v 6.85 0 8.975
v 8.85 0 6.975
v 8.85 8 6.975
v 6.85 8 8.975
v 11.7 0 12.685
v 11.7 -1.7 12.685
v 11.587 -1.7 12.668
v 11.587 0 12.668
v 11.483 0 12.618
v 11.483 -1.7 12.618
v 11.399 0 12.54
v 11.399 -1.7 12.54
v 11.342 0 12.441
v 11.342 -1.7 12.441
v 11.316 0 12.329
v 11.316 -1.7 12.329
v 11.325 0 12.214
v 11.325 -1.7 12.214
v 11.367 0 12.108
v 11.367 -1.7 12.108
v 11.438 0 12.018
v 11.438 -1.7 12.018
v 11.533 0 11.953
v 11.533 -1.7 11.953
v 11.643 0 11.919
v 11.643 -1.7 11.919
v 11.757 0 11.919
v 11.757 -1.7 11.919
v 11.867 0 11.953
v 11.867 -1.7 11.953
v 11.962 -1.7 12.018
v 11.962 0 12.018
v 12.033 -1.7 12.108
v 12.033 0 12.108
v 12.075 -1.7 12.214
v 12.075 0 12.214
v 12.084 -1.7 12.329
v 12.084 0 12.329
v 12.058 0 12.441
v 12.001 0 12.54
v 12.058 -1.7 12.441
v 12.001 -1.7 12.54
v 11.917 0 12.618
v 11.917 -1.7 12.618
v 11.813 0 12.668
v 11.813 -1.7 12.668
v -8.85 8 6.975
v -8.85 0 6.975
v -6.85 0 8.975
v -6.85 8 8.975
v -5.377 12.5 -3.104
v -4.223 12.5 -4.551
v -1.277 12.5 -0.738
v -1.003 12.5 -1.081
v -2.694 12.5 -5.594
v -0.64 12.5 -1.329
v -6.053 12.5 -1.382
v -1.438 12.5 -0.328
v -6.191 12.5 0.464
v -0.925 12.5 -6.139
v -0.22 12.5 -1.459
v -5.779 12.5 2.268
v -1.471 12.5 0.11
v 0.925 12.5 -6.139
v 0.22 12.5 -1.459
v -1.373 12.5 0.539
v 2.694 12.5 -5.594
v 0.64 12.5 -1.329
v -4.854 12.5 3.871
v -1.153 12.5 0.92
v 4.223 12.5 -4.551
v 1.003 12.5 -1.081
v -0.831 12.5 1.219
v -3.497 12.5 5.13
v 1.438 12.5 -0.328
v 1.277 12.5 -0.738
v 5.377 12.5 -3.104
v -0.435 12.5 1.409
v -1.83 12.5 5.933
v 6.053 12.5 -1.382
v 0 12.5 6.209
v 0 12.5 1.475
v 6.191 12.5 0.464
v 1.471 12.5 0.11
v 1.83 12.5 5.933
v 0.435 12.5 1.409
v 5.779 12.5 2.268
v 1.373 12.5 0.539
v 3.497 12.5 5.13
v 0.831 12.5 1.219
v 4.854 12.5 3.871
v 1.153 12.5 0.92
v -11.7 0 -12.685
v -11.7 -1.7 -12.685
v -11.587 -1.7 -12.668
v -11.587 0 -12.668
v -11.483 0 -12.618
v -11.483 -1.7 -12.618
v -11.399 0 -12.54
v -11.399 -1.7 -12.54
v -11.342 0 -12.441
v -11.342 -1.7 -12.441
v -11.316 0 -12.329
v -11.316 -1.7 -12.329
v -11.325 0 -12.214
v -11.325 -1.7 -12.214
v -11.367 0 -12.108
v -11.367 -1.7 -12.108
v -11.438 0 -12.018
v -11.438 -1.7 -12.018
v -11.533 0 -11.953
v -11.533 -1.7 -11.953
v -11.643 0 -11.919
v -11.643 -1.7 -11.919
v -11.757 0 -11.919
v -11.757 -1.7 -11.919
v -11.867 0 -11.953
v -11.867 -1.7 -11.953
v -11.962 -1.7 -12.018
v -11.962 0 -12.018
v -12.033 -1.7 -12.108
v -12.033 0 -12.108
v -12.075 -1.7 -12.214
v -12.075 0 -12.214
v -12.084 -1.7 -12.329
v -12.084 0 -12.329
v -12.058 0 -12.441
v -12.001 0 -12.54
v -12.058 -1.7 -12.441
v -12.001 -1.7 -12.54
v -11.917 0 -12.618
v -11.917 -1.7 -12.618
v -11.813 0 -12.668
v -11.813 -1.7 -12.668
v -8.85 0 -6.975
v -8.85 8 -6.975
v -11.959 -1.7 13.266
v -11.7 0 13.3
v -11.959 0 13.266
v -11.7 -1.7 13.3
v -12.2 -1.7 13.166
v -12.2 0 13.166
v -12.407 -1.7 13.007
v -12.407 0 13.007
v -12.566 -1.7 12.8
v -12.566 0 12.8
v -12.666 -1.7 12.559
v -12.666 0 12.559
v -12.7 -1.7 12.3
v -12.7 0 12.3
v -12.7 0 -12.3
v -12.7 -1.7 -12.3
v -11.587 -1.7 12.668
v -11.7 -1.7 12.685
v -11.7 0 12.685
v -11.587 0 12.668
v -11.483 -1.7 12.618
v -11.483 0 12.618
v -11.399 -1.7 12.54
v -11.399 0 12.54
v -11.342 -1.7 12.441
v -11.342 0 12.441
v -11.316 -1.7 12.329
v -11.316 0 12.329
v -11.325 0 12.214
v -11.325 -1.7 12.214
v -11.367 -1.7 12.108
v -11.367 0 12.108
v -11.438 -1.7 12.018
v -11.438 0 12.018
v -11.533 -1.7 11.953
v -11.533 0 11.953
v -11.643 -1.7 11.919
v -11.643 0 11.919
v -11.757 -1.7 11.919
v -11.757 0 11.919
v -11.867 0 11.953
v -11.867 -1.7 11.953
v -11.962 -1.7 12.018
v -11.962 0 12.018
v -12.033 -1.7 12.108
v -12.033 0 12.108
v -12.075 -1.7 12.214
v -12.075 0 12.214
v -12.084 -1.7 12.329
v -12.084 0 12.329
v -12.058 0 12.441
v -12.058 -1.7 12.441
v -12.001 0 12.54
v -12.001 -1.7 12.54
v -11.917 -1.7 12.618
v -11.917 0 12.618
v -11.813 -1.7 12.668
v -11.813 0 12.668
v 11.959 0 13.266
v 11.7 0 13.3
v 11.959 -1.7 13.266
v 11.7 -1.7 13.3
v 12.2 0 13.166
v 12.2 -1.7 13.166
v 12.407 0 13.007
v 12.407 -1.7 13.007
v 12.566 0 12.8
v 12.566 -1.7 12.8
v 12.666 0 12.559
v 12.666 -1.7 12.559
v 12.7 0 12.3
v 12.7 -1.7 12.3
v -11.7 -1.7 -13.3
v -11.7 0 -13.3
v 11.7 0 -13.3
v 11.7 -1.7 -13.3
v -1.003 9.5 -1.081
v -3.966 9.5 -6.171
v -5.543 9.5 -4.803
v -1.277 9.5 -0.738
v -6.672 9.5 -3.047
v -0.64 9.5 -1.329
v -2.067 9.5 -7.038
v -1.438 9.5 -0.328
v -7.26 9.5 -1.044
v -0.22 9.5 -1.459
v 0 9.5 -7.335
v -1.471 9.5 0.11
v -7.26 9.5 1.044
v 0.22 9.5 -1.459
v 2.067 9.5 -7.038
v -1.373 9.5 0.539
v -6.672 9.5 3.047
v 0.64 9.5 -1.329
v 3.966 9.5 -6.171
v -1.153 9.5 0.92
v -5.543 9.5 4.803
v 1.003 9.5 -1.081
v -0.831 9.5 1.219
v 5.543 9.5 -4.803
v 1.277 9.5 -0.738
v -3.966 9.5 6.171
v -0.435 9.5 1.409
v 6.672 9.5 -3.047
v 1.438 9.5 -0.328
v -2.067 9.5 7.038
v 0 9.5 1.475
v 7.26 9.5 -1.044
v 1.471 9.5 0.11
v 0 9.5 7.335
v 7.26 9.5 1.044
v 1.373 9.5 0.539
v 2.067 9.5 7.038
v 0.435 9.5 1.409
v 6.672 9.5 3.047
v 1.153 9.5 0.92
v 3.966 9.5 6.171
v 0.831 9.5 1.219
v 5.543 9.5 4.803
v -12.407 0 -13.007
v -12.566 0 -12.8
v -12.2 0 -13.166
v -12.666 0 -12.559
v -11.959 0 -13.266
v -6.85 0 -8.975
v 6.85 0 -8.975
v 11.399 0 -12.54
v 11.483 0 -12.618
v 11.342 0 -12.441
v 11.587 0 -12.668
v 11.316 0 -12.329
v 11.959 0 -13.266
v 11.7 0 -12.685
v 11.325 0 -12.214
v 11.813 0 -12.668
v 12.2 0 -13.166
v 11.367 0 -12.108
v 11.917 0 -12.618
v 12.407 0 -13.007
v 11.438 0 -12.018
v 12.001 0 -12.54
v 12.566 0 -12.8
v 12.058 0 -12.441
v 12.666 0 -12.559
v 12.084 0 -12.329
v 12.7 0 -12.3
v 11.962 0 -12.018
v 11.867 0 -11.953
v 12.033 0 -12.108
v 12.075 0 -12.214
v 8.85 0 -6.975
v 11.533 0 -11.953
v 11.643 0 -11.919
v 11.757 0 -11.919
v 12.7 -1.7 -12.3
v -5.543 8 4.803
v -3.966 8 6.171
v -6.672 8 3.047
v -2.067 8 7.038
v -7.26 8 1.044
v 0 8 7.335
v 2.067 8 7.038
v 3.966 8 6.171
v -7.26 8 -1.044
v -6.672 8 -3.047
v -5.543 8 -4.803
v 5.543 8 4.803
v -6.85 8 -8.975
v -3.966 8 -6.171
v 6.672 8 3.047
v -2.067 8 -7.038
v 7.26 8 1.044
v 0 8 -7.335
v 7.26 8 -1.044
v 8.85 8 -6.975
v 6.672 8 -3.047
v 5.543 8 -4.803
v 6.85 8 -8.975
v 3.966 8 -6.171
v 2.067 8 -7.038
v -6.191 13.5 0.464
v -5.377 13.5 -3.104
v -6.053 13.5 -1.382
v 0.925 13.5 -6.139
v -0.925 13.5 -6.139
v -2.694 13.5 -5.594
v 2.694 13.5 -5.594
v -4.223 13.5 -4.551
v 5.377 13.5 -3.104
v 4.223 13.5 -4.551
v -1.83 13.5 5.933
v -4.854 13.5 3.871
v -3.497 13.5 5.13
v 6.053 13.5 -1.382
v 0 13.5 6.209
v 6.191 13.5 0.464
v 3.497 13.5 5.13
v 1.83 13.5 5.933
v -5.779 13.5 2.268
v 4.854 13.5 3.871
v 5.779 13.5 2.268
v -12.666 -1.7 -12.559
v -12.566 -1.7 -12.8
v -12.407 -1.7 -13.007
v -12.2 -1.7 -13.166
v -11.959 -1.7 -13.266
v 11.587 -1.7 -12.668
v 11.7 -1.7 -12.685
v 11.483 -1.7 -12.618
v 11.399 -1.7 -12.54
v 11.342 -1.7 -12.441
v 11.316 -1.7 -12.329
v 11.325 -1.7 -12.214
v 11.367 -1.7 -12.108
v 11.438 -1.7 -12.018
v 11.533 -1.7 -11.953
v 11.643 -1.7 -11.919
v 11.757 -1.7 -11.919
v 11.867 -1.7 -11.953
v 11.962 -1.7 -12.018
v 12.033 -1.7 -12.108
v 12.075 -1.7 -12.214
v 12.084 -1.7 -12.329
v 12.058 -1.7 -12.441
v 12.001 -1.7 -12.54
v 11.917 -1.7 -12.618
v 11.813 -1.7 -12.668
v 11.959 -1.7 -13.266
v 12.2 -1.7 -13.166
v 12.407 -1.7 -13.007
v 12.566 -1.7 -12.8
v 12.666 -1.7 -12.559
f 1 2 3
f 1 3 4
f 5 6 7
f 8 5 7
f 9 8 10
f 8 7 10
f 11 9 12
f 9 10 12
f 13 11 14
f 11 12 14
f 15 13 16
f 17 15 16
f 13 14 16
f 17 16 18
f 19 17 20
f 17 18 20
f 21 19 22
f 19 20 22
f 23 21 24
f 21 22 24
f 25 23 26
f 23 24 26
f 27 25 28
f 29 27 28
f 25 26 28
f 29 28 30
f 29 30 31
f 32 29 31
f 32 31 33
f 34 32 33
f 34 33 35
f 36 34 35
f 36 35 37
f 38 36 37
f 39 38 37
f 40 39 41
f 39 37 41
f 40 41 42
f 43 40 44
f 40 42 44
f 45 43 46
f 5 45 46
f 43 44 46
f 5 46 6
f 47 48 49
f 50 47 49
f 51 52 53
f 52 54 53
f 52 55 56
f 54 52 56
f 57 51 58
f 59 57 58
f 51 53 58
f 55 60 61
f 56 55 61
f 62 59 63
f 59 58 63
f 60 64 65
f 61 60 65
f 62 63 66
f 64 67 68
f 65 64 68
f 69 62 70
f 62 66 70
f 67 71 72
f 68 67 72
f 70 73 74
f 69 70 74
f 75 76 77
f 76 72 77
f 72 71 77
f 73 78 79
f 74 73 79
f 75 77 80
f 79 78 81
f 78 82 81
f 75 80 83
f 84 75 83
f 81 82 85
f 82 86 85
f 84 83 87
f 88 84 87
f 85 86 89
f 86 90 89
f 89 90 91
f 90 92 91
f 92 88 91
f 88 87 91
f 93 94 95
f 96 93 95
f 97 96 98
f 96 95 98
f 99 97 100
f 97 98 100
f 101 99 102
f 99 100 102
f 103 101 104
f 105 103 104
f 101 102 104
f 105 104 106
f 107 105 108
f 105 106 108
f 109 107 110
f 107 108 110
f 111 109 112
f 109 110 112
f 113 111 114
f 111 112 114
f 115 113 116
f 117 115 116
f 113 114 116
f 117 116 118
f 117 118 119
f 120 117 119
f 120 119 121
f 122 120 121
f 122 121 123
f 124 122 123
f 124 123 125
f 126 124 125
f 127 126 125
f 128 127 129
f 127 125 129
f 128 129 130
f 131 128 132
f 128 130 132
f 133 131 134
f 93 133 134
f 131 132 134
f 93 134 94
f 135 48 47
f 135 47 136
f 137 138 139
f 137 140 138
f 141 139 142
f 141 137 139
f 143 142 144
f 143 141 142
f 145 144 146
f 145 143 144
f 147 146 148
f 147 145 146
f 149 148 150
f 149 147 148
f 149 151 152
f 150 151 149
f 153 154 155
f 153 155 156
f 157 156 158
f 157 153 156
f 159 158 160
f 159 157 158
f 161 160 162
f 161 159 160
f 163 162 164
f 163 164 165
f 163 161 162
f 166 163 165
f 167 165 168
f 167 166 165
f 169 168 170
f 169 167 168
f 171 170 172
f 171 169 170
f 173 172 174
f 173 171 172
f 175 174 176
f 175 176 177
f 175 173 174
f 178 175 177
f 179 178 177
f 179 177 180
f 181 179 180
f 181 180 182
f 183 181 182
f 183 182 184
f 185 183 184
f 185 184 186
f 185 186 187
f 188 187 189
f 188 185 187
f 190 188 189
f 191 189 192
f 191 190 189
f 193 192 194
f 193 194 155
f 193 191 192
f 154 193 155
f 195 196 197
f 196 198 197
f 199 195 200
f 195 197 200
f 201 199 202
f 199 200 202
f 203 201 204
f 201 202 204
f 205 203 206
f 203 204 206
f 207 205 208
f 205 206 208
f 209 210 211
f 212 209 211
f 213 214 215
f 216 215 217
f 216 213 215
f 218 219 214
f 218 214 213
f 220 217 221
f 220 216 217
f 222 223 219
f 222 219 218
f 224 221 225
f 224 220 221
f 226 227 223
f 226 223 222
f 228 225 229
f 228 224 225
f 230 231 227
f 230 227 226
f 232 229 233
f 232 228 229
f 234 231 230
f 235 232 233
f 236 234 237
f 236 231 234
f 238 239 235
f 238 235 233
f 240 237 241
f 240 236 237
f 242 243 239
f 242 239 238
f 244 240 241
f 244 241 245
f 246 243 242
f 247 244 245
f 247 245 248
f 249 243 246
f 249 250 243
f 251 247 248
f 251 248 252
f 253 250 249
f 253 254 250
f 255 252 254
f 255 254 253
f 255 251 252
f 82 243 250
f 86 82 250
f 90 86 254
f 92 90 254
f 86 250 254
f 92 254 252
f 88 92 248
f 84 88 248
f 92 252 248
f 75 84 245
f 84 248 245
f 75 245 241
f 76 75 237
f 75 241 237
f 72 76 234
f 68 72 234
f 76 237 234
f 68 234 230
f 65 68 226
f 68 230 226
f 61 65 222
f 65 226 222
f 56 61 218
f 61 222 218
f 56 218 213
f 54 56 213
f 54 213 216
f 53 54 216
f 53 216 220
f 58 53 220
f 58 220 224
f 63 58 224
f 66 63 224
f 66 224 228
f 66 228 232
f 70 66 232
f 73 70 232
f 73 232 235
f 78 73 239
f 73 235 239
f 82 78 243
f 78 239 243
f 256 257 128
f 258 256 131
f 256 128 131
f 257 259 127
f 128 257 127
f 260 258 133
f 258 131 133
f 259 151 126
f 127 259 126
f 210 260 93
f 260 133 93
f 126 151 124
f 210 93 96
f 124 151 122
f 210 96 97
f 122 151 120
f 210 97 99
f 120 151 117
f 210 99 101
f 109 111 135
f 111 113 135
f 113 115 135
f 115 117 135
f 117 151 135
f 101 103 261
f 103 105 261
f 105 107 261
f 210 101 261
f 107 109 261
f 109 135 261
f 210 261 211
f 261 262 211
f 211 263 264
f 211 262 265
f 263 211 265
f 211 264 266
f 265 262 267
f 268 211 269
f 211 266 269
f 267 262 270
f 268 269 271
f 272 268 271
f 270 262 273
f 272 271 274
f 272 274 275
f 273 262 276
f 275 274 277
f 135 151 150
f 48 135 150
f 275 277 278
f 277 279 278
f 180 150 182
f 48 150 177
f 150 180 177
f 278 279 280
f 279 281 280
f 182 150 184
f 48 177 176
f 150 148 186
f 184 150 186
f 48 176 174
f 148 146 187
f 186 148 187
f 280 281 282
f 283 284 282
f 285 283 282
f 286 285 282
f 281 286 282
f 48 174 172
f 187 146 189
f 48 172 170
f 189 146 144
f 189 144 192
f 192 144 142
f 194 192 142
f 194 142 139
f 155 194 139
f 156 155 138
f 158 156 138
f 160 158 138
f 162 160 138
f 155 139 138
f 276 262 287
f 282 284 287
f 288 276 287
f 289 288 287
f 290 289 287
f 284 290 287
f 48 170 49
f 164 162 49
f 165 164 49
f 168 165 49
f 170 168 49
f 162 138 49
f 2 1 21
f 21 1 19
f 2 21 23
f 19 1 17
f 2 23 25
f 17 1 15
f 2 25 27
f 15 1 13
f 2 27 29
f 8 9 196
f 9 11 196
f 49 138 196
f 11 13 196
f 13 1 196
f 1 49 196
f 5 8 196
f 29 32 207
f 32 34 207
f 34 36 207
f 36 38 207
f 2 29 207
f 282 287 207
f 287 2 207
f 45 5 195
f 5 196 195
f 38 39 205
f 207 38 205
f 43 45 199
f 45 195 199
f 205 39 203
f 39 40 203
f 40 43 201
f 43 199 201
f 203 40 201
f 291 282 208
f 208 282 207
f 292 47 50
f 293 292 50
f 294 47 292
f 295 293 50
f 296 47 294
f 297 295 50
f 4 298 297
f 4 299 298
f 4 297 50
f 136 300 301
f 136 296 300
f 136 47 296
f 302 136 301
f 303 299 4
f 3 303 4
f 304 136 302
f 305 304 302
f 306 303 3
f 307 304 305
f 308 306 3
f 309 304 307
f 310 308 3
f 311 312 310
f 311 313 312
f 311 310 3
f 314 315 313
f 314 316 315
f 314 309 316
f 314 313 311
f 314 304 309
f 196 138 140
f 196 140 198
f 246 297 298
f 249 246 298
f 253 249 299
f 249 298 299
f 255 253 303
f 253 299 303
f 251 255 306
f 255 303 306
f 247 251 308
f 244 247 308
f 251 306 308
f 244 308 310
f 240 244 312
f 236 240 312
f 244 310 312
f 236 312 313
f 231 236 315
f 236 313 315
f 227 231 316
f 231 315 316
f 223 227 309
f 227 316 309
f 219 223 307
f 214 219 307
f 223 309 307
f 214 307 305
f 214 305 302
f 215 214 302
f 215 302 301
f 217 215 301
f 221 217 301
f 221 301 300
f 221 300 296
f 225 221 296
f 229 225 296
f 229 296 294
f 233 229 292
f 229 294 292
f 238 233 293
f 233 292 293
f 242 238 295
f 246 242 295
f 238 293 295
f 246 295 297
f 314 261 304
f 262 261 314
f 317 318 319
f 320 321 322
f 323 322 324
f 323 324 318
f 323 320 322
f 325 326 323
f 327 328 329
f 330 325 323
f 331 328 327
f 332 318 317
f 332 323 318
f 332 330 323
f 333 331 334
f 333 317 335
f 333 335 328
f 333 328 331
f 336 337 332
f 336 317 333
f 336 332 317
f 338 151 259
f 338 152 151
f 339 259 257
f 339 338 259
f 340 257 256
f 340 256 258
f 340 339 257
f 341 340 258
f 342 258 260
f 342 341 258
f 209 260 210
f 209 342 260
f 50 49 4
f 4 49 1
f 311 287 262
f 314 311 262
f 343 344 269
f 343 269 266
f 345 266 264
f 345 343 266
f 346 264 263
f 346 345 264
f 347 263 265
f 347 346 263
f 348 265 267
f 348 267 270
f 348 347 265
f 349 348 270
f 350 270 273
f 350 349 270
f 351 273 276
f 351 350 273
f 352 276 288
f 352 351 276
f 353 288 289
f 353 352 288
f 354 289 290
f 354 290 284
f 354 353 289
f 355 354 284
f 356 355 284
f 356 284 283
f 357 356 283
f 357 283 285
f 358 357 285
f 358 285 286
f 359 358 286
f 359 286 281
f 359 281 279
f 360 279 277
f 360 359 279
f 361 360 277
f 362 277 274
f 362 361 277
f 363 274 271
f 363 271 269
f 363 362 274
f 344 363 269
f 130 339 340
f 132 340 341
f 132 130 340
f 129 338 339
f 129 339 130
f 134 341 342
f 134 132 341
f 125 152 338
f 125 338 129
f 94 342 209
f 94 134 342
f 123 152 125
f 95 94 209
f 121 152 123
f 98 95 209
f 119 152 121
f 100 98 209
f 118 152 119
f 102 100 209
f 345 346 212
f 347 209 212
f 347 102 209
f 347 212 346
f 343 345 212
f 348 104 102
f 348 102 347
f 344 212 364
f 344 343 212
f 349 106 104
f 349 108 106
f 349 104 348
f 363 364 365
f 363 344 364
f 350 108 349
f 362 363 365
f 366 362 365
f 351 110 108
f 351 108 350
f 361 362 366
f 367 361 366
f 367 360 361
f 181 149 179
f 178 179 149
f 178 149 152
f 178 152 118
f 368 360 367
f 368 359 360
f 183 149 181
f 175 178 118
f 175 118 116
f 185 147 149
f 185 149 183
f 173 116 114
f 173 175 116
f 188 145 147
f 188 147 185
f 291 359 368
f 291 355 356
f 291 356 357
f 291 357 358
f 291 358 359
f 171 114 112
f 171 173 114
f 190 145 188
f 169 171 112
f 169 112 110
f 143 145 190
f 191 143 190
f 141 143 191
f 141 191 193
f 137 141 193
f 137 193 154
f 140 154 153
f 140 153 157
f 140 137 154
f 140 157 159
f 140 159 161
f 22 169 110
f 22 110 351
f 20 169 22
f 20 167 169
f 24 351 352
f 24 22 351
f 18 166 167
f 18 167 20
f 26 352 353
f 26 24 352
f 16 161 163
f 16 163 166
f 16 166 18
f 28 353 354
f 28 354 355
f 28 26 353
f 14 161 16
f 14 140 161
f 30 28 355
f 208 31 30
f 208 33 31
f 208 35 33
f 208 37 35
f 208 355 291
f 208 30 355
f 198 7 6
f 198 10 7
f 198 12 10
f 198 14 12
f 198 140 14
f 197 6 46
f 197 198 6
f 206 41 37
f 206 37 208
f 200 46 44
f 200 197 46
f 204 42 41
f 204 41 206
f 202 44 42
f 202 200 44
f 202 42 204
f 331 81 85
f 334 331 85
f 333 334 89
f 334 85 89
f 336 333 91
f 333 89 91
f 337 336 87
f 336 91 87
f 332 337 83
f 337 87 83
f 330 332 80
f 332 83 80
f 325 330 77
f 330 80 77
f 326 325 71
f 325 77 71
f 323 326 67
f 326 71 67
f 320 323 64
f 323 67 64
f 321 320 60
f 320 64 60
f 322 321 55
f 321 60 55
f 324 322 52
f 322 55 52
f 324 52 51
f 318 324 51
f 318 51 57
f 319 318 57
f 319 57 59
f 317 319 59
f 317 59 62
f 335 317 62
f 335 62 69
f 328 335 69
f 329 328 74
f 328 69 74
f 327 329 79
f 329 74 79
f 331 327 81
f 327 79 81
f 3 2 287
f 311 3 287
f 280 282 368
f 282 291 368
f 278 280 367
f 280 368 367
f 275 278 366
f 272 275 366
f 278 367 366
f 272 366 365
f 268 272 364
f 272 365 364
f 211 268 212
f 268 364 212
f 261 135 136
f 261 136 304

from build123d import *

# Parameters (mm, degrees)
ESQUISSE1_W                                = 17.7
ESQUISSE1_H                                = 17.95
BOSS_EXTRU_1_DEPTH                         = 8
ENL_V_MAT_EXTRU_1_DEPTH                    = 8
SYM_TRIE1_AT_THE_SECOND_PLANE_COPY_1_DEPTH = 8
ESQUISSE4_R                                = 7.334991569
BOSS_EXTRU_2_DEPTH                         = 1.5
ESQUISSE5_R                                = 1.475
BOSS_EXTRU_3_DEPTH                         = 3
ESQUISSE6_R                                = 6.208536563
BOSS_EXTRU_4_DEPTH                         = 1
ESQUISSE7_W                                = 25.4
ESQUISSE7_H                                = 26.6
BOSS_EXTRU_5_DEPTH                         = 1.7
CONG_1_R                                   = 1
CONG_2_R                                   = 1
ESQUISSE8_R                                = 0.384895333
ENL_V_MAT_EXTRU_2_DEPTH                    = 1.7
SYM_TRIE5_AT_THE_SECOND_PLANE_COPY_1_SKE_R = 0.384895333
SYM_TRIE5_AT_THE_SECOND_PLANE_COPY_1_DEPTH = 1.7


with BuildPart() as part:
    # Esquisse1 → Boss.-Extru.1 (new body)
    with BuildSketch(Plane(origin=(0, 0, 0), x_dir=(1, 0, 0), z_dir=(0, 1, 0))):
        Rectangle(ESQUISSE1_W, ESQUISSE1_H)
    extrude(amount=BOSS_EXTRU_1_DEPTH)

    # Esquisse2 → Enlèv. mat.-Extru.1 (cut)
    with BuildSketch(Plane(origin=(0, 8, 0), x_dir=(1, 0, 0), z_dir=(0, 1, 0))):
        Polygon((-8.85, -6.975), (-6.85, -8.975), (-8.85, -8.975), align=None)
    enl_v_mat_extru_1 = extrude(amount=-ENL_V_MAT_EXTRU_1_DEPTH, mode=Mode.SUBTRACT)

    # Symétrie1: Enlèv. mat.-Extru.1 across plane
    add(enl_v_mat_extru_1.mirror(Plane.XY), mode=Mode.SUBTRACT)

    # Symétrie1 at the second plane: Enlèv. mat.-Extru.1 across plane
    add(enl_v_mat_extru_1.mirror(Plane(origin=(0, 0, 0), x_dir=(0, 0, 1), z_dir=(1, 0, 0))), mode=Mode.SUBTRACT)

    # Symétrie1 at the second plane copy 1 ske → Symétrie1 at the second plane copy 1 (cut)
    with BuildSketch(Plane(origin=(0, 8, 0), x_dir=(-1, 0, 0), z_dir=(0, 1, 0))):
        Polygon((-8.85, -6.975), (-6.85, -8.975), (-8.85, -8.975), align=None)
    extrude(amount=-SYM_TRIE1_AT_THE_SECOND_PLANE_COPY_1_DEPTH, mode=Mode.SUBTRACT)

    # Esquisse4 → Boss.-Extru.2 (add)
    with BuildSketch(Plane(origin=(0, 8, 0), x_dir=(1, 0, 0), z_dir=(0, 1, 0))):
        with Locations(Location((0, 0, 0), (0, 0, 270))):
            Circle(ESQUISSE4_R)
    extrude(amount=BOSS_EXTRU_2_DEPTH)

    # Esquisse5 → Boss.-Extru.3 (add)
    with BuildSketch(Plane(origin=(0, 9.5, 0), x_dir=(1, 0, 0), z_dir=(0, 1, 0))):
        with Locations(Location((0, 0, 0), (0, 0, 270))):
            Circle(ESQUISSE5_R)
    extrude(amount=BOSS_EXTRU_3_DEPTH)

    # Esquisse6 → Boss.-Extru.4 (add)
    with BuildSketch(Plane(origin=(0, 12.5, 0), x_dir=(1, 0, 0), z_dir=(0, 1, 0))):
        with Locations(Location((0, 0, 0), (0, 0, 270))):
            Circle(ESQUISSE6_R)
    extrude(amount=BOSS_EXTRU_4_DEPTH)

    # Esquisse7 → Boss.-Extru.5 (add)
    with BuildSketch(Plane.XZ):
        Rectangle(ESQUISSE7_W, ESQUISSE7_H)
    extrude(amount=BOSS_EXTRU_5_DEPTH)

    # Congé1
    cong_1_edges = [part.edges().sort_by_distance(p)[0] for p in [
        (12.7, -0.85, 13.3),
    ]]
    fillet(cong_1_edges, radius=CONG_1_R)

    # Congé2
    cong_2_edges = [part.edges().sort_by_distance(p)[0] for p in [
        (12.7, -0.85, -13.3),
        (-12.7, -0.85, 13.3),
        (-12.7, -0.85, -13.3),
    ]]
    fillet(cong_2_edges, radius=CONG_2_R)

    # Esquisse8 → Enlèv. mat.-Extru.2 (cut)
    with BuildSketch(Plane.XZ.offset(1.7)):
        with Locations(Location((-11.7, -12.3, 0), (0, 0, 270))):
            Circle(ESQUISSE8_R)
    enl_v_mat_extru_2 = extrude(amount=-ENL_V_MAT_EXTRU_2_DEPTH, mode=Mode.SUBTRACT)

    # Symétrie5: Enlèv. mat.-Extru.2 across plane
    add(enl_v_mat_extru_2.mirror(Plane.XY), mode=Mode.SUBTRACT)

    # Symétrie5 at the second plane: Enlèv. mat.-Extru.2 across plane
    add(enl_v_mat_extru_2.mirror(Plane(origin=(0, 0, 0), x_dir=(0, 0, 1), z_dir=(1, 0, 0))), mode=Mode.SUBTRACT)

    # Symétrie5 at the second plane copy 1 ske → Symétrie5 at the second plane copy 1 (cut)
    with BuildSketch(Plane(origin=(0, -1.7, 0), x_dir=(-1, 0, 0), z_dir=(0, -1, 0))):
        with Locations(Location((-11.7, -12.3, 0), (0, 0, 270))):
            Circle(SYM_TRIE5_AT_THE_SECOND_PLANE_COPY_1_SKE_R)
    extrude(amount=-SYM_TRIE5_AT_THE_SECOND_PLANE_COPY_1_DEPTH, mode=Mode.SUBTRACT)


solid = part.part
